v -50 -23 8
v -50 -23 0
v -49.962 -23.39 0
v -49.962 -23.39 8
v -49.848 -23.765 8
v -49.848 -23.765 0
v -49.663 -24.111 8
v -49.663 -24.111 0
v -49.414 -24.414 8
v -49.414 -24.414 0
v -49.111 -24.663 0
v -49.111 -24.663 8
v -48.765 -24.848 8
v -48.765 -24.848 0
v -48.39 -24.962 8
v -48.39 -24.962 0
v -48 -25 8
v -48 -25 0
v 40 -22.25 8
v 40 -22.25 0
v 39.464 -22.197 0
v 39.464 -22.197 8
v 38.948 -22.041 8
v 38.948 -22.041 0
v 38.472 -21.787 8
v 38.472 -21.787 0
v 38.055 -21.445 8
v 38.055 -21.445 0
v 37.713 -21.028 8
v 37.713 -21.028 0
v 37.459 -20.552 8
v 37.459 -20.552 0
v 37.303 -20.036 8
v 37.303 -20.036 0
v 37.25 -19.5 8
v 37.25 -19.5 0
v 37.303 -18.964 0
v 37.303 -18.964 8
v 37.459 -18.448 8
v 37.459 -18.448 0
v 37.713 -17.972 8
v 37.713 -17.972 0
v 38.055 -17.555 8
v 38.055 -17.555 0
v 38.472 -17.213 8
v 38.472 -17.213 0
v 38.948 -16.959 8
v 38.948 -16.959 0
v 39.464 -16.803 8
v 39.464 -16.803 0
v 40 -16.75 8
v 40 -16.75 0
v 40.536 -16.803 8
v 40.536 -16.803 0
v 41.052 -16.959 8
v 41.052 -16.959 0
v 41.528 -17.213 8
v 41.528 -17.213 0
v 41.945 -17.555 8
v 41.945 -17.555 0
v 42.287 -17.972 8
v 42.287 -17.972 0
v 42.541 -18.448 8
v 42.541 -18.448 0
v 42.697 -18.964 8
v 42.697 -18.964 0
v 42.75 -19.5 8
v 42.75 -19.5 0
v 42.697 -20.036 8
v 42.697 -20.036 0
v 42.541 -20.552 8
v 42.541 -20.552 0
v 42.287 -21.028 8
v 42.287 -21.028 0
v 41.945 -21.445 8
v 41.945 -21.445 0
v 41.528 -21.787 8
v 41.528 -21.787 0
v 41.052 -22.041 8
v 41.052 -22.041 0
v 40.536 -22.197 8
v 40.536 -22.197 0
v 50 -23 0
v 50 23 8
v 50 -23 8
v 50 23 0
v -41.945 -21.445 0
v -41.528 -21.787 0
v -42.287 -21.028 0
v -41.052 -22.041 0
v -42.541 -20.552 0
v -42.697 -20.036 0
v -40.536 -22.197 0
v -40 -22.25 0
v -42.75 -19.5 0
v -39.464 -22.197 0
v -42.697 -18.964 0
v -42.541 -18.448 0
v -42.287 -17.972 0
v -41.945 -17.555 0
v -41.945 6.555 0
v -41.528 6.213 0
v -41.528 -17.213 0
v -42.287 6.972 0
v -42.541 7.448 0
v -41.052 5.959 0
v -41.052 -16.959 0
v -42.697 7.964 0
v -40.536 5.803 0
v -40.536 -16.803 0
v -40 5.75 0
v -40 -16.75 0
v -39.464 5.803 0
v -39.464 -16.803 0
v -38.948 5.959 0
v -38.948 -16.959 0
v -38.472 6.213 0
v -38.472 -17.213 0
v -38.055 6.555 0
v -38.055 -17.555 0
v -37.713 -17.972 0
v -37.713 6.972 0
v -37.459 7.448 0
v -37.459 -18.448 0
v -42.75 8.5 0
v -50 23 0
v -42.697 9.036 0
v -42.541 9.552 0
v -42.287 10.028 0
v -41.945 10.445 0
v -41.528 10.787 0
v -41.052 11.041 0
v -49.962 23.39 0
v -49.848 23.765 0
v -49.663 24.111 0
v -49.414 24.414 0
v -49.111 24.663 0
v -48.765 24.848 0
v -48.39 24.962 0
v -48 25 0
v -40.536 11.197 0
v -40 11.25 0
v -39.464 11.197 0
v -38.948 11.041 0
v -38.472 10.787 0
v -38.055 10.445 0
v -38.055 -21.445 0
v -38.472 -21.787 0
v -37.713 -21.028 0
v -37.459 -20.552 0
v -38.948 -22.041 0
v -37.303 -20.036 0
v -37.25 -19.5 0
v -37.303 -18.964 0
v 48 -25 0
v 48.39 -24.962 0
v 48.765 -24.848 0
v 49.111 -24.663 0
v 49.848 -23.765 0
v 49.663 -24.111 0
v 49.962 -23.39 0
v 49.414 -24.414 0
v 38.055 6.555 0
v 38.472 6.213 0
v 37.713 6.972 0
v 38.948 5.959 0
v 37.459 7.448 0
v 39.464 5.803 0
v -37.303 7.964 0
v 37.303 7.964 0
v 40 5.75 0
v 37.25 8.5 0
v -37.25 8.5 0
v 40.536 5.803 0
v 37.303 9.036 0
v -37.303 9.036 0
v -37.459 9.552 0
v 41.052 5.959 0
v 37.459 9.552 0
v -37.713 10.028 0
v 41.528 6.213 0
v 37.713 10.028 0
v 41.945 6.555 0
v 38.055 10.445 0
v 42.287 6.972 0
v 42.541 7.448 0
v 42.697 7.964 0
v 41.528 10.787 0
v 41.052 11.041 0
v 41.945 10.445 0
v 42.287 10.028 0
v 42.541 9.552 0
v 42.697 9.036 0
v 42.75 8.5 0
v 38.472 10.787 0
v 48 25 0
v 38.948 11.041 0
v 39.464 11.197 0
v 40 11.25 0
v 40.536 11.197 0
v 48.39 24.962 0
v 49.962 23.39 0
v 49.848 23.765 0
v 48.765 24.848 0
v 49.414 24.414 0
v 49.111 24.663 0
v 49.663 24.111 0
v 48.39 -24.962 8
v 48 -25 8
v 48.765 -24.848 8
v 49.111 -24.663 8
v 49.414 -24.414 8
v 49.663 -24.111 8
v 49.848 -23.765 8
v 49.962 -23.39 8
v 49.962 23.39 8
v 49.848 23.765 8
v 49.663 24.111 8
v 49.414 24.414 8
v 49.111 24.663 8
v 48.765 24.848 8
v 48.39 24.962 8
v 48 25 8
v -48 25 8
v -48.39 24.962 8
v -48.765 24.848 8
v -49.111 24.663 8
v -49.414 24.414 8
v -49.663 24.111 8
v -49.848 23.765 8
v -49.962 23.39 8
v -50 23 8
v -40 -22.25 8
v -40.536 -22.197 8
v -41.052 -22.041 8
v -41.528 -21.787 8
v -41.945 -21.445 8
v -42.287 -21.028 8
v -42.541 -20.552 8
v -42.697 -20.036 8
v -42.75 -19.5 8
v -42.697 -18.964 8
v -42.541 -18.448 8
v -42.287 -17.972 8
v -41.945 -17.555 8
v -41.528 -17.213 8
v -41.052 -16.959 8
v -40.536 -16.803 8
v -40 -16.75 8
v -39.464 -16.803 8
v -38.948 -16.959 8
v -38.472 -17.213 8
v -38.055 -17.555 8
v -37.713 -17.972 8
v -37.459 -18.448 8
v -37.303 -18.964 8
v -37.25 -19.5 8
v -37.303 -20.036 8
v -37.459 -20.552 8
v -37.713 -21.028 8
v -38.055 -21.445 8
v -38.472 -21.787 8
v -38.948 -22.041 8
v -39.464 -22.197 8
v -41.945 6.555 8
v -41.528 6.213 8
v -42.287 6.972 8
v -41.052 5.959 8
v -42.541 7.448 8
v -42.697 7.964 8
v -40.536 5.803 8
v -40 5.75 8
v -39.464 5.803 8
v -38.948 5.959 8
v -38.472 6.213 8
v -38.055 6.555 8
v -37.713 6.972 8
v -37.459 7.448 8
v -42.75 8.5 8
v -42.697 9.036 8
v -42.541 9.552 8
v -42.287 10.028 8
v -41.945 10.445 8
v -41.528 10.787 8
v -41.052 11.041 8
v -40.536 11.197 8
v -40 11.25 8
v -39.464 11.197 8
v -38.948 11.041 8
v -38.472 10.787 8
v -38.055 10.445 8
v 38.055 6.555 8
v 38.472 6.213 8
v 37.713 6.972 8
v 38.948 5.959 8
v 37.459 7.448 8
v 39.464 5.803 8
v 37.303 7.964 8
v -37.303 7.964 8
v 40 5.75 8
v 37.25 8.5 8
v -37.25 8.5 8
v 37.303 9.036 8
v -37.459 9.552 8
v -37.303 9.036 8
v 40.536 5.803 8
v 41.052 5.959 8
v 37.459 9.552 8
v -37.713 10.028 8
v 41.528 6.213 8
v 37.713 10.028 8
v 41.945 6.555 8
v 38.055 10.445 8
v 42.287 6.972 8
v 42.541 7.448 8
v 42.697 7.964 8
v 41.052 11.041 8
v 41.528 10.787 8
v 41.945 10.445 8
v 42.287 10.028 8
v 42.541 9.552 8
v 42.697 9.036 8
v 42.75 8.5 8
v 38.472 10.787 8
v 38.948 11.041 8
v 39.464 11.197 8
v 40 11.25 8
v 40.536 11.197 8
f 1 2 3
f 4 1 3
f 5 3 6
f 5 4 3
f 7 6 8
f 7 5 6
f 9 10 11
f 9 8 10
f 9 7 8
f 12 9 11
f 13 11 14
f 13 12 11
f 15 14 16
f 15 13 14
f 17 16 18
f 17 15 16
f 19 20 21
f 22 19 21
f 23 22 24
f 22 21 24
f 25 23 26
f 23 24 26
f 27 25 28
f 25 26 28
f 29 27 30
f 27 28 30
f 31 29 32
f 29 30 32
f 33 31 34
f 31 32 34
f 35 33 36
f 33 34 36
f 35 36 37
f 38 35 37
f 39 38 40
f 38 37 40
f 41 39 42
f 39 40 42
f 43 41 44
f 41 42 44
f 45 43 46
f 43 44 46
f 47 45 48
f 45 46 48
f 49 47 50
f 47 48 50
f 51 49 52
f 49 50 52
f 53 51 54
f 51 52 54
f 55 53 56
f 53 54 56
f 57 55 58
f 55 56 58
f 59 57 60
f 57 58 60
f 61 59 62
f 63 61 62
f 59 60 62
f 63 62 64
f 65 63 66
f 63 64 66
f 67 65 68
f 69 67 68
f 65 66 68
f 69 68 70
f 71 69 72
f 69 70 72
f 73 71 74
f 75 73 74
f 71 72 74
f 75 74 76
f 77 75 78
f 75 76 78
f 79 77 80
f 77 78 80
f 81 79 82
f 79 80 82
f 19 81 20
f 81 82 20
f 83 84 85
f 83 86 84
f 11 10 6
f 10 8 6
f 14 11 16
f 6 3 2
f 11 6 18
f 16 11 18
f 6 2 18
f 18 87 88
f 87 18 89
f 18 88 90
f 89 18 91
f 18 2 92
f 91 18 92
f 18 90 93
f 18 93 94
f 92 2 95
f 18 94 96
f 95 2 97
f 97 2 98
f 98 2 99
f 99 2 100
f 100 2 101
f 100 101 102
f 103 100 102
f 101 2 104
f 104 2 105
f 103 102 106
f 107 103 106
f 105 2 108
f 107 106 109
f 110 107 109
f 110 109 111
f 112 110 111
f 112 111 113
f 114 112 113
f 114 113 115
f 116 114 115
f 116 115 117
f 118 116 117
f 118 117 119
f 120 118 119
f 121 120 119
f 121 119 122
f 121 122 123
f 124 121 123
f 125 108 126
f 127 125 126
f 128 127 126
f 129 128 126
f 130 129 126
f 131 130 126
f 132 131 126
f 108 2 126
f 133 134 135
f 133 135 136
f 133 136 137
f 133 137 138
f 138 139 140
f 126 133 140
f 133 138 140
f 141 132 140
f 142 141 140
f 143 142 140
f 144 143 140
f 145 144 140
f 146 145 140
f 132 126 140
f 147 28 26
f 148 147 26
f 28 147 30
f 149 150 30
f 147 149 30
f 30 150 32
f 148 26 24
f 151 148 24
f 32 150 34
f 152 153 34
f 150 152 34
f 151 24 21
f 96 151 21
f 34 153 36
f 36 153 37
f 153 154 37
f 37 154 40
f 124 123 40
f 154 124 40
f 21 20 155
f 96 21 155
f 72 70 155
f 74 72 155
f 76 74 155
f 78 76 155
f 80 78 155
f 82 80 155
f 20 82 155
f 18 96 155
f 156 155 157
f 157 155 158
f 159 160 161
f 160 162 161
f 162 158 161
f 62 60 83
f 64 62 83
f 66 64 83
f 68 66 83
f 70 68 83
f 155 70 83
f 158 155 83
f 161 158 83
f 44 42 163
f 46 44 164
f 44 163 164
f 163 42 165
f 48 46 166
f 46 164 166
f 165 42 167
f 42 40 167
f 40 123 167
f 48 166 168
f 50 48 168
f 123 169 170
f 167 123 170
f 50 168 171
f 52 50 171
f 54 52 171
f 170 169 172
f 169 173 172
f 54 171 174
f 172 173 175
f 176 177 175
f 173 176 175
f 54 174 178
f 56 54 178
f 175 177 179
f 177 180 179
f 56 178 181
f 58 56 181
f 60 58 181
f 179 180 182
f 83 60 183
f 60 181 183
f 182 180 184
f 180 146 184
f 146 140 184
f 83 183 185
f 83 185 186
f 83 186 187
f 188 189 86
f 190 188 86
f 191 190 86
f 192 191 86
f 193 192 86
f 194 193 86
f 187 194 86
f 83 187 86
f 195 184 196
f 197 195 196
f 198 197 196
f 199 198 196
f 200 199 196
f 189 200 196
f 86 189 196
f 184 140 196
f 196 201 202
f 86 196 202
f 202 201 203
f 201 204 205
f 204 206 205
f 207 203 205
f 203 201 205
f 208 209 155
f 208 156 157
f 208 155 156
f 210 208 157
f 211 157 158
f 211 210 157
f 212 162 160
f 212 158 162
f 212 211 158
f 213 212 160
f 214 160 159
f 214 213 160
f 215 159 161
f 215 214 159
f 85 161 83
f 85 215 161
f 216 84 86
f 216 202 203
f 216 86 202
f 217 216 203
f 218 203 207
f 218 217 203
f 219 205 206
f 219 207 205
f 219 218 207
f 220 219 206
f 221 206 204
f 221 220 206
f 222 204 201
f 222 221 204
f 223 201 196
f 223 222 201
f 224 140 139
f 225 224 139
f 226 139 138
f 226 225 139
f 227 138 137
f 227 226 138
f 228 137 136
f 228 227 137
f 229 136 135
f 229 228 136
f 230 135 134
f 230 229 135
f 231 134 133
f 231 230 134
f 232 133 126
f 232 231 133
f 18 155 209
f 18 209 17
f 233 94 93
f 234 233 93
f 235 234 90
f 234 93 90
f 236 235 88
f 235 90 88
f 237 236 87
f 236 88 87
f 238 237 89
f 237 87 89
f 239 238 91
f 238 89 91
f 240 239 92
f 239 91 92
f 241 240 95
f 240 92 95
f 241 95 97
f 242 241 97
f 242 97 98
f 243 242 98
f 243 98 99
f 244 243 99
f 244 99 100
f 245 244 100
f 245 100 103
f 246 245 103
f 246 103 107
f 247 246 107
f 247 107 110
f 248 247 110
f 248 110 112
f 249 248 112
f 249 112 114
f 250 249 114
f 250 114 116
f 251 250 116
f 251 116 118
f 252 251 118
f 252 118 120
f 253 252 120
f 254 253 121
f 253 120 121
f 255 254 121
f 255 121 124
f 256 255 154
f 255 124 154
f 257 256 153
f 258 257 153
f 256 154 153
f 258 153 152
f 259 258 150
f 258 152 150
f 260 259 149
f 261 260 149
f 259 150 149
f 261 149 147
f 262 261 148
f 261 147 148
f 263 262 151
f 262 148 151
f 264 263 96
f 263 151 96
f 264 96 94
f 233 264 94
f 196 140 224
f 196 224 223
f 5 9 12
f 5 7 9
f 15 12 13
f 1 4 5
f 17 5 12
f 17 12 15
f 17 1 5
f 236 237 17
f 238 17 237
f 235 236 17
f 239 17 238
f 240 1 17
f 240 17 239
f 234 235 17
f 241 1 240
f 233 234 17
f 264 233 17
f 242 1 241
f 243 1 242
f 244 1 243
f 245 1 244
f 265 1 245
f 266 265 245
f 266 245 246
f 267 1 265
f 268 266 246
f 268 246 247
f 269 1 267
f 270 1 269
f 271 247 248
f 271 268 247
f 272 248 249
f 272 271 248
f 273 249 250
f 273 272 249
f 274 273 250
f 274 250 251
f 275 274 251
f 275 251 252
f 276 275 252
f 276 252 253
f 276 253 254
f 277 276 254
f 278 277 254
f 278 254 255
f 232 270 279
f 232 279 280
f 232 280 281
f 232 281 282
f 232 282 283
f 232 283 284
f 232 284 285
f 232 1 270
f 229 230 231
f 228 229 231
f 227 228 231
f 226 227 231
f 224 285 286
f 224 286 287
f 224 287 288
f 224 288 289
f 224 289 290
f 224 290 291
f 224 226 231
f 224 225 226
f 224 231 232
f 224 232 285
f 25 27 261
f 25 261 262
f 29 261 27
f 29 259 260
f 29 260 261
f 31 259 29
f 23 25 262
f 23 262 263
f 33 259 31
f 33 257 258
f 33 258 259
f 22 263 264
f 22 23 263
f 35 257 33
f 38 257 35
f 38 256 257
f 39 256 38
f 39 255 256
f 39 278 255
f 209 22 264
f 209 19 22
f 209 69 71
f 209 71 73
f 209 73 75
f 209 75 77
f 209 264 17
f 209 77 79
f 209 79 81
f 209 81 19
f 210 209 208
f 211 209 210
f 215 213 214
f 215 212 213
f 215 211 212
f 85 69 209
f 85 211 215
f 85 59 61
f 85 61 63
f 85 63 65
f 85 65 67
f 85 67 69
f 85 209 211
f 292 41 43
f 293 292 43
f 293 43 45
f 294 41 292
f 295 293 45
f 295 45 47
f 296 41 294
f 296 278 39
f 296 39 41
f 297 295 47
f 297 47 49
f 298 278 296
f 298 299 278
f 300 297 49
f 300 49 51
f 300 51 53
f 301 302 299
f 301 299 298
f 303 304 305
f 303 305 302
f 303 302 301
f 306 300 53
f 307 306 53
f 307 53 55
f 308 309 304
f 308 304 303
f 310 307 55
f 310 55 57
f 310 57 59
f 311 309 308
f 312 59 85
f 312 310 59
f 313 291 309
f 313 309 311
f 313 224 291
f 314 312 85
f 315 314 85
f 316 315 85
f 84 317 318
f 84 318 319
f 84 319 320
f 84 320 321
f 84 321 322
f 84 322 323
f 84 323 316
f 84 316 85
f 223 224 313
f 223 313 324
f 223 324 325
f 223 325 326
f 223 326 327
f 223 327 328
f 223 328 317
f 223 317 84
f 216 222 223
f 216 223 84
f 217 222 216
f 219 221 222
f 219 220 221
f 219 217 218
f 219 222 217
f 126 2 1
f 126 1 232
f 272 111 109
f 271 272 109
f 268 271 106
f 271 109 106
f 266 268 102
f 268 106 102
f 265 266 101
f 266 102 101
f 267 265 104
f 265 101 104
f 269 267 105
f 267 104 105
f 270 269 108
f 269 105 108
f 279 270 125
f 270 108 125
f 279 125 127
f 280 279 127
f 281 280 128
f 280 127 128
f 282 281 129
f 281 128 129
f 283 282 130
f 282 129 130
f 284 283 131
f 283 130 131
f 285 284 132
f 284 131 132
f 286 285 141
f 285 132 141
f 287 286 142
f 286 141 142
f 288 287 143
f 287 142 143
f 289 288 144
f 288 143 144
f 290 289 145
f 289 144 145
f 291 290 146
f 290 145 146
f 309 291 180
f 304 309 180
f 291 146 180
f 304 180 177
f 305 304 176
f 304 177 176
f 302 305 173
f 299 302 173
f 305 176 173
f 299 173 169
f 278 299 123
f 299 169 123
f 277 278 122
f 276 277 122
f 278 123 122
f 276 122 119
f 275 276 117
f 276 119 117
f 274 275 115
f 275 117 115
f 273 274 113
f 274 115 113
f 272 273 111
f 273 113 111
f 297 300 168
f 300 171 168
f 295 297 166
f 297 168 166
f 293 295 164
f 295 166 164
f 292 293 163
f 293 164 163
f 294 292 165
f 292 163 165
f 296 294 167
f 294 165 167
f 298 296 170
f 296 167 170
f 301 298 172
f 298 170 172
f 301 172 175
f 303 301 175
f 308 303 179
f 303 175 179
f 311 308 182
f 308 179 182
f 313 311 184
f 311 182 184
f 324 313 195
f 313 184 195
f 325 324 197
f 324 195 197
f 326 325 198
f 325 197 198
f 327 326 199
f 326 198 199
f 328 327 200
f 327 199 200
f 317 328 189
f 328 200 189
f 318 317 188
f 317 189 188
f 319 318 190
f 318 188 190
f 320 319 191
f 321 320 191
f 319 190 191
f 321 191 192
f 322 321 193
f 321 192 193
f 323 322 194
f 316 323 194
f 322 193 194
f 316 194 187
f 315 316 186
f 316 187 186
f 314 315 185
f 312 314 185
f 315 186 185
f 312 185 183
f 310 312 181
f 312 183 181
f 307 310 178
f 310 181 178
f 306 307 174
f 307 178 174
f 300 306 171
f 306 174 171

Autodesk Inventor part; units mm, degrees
ref_plane "YZ Plane" through (0, 0, 0) normal (1, 0, 0) x (0, 1, 0)
ref_plane "XZ Plane" through (0, 0, 0) normal (0, 1, 0) x (-1, 0, 0)
ref_plane "XY Plane" through (0, 0, 0) normal (0, 0, 1) x (1, 0, 0)
sketch "Schizzo1" plane through (0, 0, 0) normal (0, 0, 1) x (1, 0, 0)
  line L0 (-50, 25) -> (50, 25)
  line L1 (50, 25) -> (50, -25)
  line L2 (50, -25) -> (-50, -25)
  line L3 (-50, -25) -> (-50, 25)
  line L4 (-50, 25) -> (50, -25) construction
  line L5 (50, 25) -> (-50, -25) construction
  point P0 (0, 0)
  dimension "d0" = 100
  dimension "d1" = 50
extrude "Estrusione1" add sketch "Schizzo1" along normal blind 8
fillet "Raccordo1" radius 2 4 edges at (-50, 25, 4) (50, 25, 4) (50, -25, 4) (-50, -25, 4)
sketch "Schizzo2" plane through (0, 0, 8) normal (0, 0, 1) x (1, 0, 0)
  circle A0 centre (-40, -19.5) radius 2.067
  line L0 (-48, -25) -> (48, -25) projected
  line L1 (-50, 23) -> (-50, -23) projected
  line L2 (50, -23) -> (50, 23) projected
  point P0 (0, 0)
  point P1 (-40, 8.5)
  point P2 (40, 8.5)
  point P3 (40, -19.5)
  dimension "d13" = 28
  dimension "d16" = 5.5
  dimension "d17" = 10
  dimension "d18" = 10
hole "Foro1" at (-40, -19.5, 8) at (-40, 8.5, 8) at (40, 8.5, 8) at (40, -19.5, 8) direction (0, 0, -1) diameter 5.5 end through all clearance for "Vite a testa esagonale con calotta ISO 24017" size "M5" standard "ISO"
properties part number "Piastra collegamento asse - pistone"
